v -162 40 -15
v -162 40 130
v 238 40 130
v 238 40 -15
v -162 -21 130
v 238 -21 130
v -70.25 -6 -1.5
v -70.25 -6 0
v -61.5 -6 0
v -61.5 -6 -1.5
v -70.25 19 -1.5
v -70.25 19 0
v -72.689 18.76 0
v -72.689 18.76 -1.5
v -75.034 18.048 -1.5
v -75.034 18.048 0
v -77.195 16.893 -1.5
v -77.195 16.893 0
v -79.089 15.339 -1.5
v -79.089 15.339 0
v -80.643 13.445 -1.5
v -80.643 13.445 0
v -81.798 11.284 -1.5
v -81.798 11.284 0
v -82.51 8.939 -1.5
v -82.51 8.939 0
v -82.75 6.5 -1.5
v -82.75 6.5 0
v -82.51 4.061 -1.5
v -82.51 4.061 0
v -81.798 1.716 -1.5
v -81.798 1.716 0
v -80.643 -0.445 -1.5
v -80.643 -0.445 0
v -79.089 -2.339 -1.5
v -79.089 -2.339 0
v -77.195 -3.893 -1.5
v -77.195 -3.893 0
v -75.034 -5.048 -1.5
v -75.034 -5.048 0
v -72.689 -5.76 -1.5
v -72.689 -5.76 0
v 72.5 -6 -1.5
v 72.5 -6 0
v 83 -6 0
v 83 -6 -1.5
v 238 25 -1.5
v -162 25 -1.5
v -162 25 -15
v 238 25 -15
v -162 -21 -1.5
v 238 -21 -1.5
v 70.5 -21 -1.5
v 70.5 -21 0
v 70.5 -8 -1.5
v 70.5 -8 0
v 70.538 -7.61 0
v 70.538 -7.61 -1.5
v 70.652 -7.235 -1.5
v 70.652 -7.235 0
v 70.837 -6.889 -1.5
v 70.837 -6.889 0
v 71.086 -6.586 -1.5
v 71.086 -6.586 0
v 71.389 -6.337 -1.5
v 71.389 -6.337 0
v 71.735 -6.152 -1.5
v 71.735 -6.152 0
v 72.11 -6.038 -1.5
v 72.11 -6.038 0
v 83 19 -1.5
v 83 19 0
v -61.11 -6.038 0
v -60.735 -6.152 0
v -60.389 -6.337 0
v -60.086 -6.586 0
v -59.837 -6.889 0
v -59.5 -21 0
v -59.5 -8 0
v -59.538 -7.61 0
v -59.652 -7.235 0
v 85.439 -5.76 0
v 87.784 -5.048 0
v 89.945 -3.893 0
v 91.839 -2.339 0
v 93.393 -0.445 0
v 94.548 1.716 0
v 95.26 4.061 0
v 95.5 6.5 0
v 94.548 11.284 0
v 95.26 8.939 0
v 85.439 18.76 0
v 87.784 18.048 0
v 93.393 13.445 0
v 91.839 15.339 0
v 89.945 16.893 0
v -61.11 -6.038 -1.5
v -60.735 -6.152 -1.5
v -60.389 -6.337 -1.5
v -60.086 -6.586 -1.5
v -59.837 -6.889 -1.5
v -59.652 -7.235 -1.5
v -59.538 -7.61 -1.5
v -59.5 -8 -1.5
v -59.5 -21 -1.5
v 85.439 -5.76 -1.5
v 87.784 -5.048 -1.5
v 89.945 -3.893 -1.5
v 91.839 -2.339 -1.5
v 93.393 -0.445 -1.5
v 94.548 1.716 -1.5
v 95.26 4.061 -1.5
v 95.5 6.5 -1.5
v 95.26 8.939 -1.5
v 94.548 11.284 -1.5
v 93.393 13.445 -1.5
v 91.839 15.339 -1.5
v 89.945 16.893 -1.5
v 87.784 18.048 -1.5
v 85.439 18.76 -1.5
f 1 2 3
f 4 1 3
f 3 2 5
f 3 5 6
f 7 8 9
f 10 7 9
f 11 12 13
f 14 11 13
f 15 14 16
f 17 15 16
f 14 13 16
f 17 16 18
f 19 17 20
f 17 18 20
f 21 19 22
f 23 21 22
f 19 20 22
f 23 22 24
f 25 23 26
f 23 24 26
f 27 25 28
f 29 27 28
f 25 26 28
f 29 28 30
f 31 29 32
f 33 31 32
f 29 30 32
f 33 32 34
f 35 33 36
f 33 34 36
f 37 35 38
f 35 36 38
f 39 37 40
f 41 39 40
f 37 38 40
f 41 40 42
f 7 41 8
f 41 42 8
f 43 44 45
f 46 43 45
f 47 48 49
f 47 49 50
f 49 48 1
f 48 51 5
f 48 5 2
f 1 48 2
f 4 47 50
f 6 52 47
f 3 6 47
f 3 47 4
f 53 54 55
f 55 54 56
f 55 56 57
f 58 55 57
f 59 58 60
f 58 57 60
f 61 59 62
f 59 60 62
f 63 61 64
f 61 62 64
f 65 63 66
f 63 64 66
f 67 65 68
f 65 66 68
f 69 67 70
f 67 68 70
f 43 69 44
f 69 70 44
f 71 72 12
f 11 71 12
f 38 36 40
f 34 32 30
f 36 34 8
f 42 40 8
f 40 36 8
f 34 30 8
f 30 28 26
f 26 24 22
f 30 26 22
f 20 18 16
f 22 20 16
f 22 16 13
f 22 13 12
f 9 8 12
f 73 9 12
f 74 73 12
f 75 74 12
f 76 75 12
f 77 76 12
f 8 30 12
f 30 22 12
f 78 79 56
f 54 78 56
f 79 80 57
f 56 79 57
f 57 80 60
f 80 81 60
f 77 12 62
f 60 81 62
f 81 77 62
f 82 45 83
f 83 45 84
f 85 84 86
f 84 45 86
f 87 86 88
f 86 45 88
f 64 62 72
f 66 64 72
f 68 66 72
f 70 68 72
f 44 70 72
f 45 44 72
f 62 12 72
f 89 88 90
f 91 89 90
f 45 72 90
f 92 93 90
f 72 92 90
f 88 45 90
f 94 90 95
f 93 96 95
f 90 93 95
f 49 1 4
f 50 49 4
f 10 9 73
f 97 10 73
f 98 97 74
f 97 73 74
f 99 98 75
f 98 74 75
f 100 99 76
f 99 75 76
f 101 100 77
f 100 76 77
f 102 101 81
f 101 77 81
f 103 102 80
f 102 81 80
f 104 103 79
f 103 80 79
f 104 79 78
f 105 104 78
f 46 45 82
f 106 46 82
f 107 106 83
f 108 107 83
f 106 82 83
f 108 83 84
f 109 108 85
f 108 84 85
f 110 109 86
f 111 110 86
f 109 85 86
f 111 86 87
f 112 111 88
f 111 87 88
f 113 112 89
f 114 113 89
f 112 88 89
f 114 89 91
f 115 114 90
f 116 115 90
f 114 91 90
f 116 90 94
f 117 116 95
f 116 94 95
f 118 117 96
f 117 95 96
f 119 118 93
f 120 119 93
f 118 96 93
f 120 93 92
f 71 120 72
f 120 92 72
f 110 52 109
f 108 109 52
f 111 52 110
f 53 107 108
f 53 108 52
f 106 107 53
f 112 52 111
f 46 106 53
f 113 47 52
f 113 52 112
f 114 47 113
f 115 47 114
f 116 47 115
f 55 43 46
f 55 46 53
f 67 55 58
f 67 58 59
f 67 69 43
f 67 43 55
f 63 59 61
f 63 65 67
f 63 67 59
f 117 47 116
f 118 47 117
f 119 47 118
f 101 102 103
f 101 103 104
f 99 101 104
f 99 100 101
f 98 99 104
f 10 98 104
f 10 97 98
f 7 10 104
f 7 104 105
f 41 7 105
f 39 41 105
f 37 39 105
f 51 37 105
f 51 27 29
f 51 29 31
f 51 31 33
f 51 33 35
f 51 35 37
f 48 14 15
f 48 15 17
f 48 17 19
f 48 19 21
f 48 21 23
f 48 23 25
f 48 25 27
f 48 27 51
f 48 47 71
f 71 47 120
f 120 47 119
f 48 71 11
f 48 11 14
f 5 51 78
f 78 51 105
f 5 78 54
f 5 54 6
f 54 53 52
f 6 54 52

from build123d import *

# Parameters (mm, degrees)
EXTRUSION1_DEPTH = 1.5
ESQUISSE3_W      = 400
ESQUISSE3_H      = 46
EXTRUSION2_DEPTH = 130
ESQUISSE4_W      = 400
ESQUISSE4_H      = 15
EXTRUSION3_DEPTH = 145


with BuildPart() as part:
    # Esquisse2 → Extrusion1 (new body)
    with BuildSketch(Plane.XY):
        with BuildLine():
            Line((238, -21), (70.5, -21))
            Line((70.5, -21), (70.5, -8))
            ThreePointArc((70.5, -8), (71.085786438, -6.585786438), (72.5, -6))
            Line((72.5, -6), (83, -6))
            ThreePointArc((83, -6), (95.5, 6.5), (83, 19))
            Line((83, 19), (-70.25, 19))
            ThreePointArc((-70.25, 19), (-82.75, 6.5), (-70.25, -6))
            Line((-70.25, -6), (-61.5, -6))
            ThreePointArc((-61.5, -6), (-60.085786438, -6.585786438), (-59.5, -8))
            Line((-59.5, -8), (-59.5, -21))
            Line((-59.5, -21), (-162, -21))
            Line((-162, -21), (-162, 25))
            Line((-162, 25), (238, 25))
            Line((238, 25), (238, -21))
        make_face()
    extrude(amount=-EXTRUSION1_DEPTH)

    # Esquisse3 → Extrusion2 (add)
    with BuildSketch(Plane.XY):
        with Locations((38, 2)):
            Rectangle(ESQUISSE3_W, ESQUISSE3_H)
    extrude(amount=EXTRUSION2_DEPTH)

    # Esquisse4 → Extrusion3 (add)
    with BuildSketch(Plane.XY.offset(130)):
        with Locations((38, 32.5)):
            Rectangle(ESQUISSE4_W, ESQUISSE4_H)
    extrude(amount=-EXTRUSION3_DEPTH)


solid = part.part
